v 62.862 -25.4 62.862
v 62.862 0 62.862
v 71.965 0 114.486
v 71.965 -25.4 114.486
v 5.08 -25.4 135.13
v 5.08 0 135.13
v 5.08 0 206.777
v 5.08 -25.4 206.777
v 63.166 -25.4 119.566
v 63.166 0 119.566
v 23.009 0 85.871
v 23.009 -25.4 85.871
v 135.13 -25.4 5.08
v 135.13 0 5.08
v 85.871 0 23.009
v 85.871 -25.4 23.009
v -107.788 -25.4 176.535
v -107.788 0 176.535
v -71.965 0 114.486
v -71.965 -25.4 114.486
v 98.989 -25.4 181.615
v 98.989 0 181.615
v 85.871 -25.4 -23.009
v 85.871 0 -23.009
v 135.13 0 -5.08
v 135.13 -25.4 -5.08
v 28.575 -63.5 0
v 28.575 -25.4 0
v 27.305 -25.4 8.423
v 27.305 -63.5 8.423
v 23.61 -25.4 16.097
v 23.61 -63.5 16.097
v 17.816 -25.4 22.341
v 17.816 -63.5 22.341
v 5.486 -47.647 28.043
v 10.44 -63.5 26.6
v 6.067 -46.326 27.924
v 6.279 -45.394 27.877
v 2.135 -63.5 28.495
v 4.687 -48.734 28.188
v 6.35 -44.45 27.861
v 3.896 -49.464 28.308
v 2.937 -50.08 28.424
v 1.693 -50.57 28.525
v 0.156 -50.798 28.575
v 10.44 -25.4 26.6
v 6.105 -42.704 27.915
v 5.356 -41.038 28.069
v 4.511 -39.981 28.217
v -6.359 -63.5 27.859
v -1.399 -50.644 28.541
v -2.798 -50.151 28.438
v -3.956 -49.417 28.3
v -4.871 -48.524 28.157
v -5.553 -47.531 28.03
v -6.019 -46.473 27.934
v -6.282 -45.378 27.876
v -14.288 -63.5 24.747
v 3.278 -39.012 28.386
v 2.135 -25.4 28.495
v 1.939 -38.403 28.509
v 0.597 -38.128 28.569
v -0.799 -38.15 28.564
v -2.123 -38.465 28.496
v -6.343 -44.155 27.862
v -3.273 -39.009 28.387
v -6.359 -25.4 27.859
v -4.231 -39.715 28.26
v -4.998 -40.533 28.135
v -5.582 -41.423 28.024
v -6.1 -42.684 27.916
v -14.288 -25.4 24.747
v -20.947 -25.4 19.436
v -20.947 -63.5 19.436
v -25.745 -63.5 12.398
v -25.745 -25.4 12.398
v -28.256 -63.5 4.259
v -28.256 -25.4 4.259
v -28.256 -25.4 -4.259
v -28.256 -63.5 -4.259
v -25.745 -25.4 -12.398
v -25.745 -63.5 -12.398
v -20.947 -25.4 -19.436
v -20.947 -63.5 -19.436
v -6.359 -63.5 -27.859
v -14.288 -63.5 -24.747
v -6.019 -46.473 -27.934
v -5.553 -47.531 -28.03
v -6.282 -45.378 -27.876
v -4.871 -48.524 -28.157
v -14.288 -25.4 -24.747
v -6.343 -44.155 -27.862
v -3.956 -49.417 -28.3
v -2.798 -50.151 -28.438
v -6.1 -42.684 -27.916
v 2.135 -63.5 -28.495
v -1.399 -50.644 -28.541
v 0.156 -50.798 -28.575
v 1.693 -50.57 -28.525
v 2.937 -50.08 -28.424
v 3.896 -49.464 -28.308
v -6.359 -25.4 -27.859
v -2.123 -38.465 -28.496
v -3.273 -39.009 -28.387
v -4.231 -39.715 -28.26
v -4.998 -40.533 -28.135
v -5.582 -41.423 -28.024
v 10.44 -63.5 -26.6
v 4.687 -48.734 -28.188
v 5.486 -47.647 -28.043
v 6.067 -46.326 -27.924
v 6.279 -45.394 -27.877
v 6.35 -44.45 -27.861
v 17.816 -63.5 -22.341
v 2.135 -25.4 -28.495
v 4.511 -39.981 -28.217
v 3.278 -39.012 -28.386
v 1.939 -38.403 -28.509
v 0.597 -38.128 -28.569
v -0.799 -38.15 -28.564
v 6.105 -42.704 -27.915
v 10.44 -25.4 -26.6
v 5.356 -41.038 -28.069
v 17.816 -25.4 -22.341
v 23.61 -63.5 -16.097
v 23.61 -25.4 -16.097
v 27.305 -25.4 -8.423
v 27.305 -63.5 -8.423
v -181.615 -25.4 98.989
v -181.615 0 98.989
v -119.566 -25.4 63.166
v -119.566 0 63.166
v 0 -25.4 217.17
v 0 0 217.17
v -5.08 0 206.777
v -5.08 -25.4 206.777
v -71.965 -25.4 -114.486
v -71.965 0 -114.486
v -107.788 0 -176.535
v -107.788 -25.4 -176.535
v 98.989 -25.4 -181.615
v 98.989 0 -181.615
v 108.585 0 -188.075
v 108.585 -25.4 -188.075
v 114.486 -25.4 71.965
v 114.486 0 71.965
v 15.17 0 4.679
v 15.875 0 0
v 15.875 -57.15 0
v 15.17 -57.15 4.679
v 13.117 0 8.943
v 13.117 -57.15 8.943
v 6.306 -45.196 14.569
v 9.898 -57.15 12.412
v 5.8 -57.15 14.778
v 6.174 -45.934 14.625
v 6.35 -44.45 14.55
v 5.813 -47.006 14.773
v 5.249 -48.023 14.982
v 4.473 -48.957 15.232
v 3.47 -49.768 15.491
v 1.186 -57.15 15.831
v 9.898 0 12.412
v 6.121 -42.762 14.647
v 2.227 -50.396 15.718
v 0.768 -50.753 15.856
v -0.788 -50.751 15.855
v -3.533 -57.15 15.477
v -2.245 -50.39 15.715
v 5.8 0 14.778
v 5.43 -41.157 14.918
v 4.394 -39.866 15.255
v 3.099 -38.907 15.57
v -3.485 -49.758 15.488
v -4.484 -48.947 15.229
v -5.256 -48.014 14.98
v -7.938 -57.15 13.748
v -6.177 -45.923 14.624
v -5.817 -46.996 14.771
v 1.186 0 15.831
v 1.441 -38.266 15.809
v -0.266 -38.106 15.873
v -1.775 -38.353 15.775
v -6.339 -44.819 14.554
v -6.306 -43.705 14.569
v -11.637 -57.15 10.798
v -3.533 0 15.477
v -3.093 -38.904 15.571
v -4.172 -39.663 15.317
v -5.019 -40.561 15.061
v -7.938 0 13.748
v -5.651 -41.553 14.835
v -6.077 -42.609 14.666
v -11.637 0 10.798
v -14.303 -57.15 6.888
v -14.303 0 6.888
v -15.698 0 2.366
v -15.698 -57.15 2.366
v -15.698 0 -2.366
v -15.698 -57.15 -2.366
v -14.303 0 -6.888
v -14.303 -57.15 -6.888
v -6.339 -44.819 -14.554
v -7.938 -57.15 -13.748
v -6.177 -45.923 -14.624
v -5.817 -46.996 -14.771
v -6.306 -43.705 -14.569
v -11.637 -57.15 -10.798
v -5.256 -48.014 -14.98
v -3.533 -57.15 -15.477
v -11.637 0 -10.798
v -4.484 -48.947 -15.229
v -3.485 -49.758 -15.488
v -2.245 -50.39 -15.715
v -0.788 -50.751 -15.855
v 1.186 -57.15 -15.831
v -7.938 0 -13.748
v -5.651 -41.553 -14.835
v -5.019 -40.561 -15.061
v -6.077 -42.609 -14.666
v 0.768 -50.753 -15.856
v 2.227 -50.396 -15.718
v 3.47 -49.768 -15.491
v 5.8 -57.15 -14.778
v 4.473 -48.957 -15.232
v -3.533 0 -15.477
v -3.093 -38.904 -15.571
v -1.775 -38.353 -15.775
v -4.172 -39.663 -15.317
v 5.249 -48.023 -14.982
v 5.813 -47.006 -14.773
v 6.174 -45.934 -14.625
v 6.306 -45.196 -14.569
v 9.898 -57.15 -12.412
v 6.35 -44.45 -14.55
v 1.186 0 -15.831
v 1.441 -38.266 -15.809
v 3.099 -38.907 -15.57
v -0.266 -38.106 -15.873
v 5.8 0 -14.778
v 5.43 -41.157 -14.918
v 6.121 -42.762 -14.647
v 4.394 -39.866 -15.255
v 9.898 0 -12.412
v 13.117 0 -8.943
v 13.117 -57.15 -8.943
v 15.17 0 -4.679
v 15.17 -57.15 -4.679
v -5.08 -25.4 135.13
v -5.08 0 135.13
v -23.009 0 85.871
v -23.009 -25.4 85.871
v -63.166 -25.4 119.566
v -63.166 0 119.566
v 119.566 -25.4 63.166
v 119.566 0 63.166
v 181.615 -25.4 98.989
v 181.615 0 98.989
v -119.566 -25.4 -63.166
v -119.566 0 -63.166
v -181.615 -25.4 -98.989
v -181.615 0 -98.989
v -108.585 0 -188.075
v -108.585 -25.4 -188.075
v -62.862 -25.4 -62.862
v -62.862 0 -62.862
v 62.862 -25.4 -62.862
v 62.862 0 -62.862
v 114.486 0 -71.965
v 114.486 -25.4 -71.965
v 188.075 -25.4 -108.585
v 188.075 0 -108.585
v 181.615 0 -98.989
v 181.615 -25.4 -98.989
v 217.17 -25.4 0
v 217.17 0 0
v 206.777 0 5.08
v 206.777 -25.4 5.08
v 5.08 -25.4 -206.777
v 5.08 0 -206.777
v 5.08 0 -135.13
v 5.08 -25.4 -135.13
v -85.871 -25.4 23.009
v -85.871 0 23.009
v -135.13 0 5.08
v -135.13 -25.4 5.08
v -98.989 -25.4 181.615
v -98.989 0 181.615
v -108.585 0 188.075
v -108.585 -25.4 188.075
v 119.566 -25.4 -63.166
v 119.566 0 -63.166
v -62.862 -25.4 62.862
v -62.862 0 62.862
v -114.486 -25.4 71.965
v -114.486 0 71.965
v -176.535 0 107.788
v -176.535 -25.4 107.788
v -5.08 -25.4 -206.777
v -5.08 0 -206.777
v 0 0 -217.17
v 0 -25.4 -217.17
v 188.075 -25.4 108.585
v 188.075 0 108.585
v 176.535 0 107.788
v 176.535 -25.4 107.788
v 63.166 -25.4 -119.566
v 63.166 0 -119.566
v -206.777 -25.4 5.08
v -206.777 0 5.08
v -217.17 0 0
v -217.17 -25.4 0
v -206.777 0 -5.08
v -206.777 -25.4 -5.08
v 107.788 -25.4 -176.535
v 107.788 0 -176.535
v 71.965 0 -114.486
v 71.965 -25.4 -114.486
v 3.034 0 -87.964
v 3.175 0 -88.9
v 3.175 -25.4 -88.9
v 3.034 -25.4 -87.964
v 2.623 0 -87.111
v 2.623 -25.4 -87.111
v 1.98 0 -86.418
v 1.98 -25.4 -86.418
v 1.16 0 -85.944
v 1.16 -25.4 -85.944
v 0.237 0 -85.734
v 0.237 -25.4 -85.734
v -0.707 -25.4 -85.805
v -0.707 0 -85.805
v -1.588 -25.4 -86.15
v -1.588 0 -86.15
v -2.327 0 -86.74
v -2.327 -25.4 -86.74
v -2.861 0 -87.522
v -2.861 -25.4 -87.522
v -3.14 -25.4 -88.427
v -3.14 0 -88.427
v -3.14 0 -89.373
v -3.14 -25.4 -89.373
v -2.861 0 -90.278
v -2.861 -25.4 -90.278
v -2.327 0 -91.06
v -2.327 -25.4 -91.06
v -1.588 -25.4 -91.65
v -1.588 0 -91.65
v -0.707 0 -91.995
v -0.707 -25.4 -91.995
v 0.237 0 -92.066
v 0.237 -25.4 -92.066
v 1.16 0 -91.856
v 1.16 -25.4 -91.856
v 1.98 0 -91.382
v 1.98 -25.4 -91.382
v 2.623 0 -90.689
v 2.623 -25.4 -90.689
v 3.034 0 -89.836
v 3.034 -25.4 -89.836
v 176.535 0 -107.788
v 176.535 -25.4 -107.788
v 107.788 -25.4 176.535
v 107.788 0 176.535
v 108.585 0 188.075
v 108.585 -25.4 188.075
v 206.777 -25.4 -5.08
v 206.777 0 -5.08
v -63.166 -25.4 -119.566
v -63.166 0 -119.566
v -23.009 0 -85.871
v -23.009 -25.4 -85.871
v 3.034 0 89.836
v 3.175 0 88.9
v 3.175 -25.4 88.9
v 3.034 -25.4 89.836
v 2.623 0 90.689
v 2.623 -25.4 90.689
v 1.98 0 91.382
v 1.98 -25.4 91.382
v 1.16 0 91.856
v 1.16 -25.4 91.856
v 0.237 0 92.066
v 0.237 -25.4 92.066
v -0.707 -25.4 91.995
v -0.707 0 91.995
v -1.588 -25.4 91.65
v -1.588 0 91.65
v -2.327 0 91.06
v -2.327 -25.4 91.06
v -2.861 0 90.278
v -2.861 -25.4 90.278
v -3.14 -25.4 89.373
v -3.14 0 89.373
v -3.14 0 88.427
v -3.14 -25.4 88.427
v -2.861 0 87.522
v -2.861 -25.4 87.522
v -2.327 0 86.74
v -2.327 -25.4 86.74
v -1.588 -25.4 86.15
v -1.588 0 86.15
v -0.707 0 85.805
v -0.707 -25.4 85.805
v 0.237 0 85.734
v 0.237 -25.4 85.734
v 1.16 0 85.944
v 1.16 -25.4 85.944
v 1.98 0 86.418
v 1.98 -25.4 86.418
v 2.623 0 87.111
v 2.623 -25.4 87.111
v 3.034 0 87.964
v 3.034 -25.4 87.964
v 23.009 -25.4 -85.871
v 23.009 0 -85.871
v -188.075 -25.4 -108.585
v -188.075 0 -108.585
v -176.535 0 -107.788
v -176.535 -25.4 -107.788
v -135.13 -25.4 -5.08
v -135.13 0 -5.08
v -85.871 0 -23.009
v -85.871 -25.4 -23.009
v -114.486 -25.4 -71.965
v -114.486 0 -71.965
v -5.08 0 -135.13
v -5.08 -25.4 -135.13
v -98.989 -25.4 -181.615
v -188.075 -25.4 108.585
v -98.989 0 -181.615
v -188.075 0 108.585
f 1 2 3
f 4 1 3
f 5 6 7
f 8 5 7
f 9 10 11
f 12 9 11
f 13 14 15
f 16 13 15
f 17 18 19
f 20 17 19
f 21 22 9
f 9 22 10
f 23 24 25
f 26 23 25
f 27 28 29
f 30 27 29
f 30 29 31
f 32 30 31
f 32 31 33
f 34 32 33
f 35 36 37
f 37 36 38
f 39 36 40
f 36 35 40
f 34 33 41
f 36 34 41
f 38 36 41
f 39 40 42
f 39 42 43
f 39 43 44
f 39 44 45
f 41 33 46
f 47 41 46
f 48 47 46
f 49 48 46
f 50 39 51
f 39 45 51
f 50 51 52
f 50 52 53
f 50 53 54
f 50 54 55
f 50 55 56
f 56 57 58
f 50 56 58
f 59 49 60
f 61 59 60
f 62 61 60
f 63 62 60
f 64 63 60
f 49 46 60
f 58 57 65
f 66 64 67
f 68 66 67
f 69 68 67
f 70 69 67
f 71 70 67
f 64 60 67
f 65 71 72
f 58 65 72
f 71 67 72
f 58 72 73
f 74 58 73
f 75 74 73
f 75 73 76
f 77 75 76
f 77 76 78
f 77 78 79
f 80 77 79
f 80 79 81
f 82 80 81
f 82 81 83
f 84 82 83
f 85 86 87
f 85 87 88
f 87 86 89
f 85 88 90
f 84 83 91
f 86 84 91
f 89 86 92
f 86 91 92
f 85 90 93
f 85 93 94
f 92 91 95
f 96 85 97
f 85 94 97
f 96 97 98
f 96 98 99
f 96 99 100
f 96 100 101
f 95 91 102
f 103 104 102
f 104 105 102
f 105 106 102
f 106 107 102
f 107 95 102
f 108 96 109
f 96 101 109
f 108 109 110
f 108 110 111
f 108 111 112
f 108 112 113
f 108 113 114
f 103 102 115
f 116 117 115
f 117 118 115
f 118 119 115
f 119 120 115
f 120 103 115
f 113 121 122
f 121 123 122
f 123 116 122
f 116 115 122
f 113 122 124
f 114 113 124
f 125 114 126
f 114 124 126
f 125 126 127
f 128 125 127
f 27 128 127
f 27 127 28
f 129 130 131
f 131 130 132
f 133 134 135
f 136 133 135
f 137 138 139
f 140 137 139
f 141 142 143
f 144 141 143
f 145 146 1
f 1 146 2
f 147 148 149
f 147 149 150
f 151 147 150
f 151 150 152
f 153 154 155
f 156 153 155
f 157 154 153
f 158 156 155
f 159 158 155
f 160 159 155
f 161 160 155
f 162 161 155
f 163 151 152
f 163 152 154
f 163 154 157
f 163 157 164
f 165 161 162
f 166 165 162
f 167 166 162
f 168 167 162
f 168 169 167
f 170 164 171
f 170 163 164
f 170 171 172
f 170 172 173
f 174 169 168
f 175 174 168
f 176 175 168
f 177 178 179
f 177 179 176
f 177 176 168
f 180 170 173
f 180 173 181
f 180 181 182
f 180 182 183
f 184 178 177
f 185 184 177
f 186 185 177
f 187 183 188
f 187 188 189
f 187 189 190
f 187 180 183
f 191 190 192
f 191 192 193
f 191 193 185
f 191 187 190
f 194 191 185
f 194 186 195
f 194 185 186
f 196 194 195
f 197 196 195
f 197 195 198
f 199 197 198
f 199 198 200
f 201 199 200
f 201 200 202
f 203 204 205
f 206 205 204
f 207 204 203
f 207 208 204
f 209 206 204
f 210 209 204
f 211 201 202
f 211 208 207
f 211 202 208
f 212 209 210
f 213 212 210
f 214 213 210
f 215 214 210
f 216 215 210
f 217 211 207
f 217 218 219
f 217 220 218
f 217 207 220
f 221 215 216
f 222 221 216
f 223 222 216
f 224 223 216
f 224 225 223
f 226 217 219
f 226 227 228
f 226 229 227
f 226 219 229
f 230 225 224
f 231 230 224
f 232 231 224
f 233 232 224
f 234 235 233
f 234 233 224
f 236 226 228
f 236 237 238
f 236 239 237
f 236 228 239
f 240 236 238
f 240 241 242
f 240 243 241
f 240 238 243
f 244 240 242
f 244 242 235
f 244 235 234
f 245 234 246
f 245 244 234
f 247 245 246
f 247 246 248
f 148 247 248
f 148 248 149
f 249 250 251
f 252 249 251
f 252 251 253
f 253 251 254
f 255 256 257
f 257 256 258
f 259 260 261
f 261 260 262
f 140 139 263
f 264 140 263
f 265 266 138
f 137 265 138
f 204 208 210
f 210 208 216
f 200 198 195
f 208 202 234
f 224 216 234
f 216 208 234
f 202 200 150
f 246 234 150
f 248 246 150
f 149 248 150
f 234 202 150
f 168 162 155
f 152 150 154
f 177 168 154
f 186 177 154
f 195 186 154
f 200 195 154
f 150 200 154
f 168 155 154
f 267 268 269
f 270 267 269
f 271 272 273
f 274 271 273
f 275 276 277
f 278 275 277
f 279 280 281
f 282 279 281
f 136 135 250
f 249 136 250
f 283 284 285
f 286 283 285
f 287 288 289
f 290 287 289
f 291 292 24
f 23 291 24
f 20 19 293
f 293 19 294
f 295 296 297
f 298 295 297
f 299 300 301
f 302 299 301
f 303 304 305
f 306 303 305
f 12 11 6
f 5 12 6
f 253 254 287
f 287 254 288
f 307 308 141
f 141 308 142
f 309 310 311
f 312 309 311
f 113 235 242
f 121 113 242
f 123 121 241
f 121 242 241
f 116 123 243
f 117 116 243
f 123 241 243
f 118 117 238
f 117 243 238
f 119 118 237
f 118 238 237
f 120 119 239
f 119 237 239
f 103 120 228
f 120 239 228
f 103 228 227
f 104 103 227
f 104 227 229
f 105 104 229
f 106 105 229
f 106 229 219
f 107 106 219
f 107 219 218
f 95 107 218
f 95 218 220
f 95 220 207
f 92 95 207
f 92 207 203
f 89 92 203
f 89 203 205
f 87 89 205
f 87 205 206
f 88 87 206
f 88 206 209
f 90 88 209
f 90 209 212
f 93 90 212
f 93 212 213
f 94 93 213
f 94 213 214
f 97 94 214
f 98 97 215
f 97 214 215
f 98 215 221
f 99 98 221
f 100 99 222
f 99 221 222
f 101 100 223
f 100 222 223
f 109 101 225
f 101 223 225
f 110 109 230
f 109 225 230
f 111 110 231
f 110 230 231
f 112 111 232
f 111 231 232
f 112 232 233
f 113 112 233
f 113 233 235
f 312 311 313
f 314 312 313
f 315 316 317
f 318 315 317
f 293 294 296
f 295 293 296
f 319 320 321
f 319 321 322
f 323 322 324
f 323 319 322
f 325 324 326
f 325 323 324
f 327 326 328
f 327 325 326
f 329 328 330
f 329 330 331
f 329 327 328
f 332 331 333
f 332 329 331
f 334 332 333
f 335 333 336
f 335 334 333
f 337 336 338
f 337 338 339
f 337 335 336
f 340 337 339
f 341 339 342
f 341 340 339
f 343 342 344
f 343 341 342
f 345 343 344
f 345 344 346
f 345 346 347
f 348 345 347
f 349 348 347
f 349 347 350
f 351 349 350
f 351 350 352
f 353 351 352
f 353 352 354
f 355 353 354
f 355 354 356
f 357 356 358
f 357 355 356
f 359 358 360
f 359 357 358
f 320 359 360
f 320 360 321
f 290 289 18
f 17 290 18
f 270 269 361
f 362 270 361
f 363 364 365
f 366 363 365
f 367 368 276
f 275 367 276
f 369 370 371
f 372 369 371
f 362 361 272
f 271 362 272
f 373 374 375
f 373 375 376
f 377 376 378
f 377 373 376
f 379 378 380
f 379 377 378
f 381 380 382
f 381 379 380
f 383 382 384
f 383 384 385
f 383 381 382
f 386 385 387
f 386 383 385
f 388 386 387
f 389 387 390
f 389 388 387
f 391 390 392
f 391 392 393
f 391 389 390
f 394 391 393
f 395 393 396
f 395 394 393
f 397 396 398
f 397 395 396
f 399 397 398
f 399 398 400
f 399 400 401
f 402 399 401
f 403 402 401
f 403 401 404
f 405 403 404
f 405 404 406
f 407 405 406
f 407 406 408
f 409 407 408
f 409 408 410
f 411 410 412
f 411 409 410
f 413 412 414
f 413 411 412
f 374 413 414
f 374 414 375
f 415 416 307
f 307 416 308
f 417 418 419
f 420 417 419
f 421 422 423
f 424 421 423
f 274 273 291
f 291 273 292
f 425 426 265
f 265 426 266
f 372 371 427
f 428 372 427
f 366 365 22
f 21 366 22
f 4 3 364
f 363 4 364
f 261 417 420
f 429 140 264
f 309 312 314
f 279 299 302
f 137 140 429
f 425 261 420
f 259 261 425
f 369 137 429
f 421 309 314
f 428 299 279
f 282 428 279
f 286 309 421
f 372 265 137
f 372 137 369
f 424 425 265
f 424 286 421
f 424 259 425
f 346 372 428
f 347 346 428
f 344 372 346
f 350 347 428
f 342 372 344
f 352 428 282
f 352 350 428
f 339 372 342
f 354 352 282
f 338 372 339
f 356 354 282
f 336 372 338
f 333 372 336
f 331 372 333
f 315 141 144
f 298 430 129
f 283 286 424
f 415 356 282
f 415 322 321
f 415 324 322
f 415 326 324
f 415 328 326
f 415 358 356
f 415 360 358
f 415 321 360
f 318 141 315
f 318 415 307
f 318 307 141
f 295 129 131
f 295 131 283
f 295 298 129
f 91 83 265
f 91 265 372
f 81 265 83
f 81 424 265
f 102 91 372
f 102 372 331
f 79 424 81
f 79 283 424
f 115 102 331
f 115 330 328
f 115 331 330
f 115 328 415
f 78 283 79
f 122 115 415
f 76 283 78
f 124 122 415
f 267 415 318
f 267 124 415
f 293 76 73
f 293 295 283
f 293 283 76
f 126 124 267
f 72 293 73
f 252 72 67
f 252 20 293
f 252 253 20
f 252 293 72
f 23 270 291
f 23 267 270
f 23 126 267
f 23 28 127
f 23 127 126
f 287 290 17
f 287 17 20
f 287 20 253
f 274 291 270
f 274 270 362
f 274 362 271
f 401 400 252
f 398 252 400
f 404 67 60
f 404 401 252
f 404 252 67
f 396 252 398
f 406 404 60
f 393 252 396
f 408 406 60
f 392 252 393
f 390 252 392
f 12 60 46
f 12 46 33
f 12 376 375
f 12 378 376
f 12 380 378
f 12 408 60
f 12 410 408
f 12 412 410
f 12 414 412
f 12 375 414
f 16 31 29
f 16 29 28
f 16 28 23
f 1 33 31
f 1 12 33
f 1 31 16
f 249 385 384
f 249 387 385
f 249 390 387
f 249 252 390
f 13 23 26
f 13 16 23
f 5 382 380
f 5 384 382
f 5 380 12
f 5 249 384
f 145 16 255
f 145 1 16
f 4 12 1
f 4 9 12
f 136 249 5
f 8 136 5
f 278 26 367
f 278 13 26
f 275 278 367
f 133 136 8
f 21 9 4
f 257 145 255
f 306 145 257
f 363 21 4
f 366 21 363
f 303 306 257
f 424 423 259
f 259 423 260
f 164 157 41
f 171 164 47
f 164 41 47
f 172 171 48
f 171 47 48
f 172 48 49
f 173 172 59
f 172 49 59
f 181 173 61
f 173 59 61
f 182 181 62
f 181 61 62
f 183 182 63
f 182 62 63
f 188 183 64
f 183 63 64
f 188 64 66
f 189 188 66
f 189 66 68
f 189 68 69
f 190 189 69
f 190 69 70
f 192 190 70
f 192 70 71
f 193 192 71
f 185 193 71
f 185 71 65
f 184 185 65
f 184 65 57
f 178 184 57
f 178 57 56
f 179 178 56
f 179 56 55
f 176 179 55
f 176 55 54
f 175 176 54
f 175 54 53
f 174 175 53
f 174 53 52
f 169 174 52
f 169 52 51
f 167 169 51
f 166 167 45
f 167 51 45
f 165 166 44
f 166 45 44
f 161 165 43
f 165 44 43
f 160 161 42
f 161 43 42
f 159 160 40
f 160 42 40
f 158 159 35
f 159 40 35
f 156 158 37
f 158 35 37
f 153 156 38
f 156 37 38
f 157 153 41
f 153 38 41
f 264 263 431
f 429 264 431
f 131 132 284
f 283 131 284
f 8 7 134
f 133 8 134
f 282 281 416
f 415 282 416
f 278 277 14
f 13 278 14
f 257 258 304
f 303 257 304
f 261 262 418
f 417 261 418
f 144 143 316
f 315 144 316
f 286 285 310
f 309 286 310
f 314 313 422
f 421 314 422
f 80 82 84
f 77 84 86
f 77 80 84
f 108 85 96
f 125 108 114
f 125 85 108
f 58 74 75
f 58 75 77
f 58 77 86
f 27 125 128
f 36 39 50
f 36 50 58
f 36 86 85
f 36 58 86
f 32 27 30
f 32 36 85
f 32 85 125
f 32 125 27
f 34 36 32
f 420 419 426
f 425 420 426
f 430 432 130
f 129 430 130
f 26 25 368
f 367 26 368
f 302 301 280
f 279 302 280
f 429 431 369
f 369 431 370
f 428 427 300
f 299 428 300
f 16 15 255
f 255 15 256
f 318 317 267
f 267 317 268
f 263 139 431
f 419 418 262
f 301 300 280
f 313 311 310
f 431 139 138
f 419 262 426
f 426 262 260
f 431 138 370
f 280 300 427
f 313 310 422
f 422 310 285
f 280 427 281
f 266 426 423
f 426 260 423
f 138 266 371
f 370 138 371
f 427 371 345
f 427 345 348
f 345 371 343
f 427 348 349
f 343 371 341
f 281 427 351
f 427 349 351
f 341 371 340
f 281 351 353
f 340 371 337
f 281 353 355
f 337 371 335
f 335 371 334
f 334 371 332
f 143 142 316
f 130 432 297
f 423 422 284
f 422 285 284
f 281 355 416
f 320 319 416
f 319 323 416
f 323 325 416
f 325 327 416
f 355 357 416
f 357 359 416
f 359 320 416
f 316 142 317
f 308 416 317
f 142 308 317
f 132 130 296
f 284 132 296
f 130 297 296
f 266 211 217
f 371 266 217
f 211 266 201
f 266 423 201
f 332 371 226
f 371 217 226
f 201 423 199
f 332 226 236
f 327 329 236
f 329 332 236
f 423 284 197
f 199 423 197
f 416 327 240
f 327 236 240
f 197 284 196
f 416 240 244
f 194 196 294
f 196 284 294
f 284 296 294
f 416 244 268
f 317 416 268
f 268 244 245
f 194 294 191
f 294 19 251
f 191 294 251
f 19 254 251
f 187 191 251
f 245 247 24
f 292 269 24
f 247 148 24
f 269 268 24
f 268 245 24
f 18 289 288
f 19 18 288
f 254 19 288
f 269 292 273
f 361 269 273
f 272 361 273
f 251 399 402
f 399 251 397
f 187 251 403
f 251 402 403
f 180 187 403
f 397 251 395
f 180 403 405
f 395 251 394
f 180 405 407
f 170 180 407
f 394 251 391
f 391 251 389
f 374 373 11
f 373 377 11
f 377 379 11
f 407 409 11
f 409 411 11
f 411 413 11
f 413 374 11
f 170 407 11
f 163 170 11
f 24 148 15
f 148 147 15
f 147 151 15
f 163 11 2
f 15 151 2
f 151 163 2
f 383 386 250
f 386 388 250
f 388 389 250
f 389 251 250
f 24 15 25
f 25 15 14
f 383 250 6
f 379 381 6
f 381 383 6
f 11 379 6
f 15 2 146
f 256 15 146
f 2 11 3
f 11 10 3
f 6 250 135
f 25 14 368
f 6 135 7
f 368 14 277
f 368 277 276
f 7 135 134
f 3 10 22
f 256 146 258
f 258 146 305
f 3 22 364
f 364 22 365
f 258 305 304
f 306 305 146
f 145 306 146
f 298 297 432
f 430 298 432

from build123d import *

# Parameters (mm, degrees)
F2_DEPTH  = 25.4
F3_R      = 28.575
F4_DEPTH  = 63.5
F5_R      = 15.875
F6_DEPTH  = 57.15
F9_R      = 6.35
F10_DEPTH = 63.5
F11_R     = 3.175
F12_DEPTH = 25.4


with BuildPart() as f2:
    # F1 (on face) → F2 (new body)
    with BuildSketch(Plane.XZ):
        Polygon((5.08, 135.130365), (5.08, 206.777484), (0, 217.17), (-5.08, 206.777484), (-5.08, 135.130365), (-23.009013, 85.870806), (0, 0), (23.009013, 85.870806), align=None)
        Polygon((63.165773, 119.566329), (23.009013, 85.870806), (0, 0), (62.861793, 62.861793), (71.964591, 114.486329), (107.788151, 176.534554), (108.585, 188.074737), (98.989333, 181.614554), align=None)
        Polygon((-62.861793, 62.861793), (0, 0), (-23.009013, 85.870806), (-63.165773, 119.566329), (-98.989333, 181.614554), (-108.585, 188.074737), (-107.788151, 176.534554), (-71.964591, 114.486329), align=None)
        Polygon((-85.870806, 23.009013), (0, 0), (-62.861793, 62.861793), (-114.486329, 71.964591), (-176.534554, 107.788151), (-188.074737, 108.585), (-181.614554, 98.989333), (-119.566329, 63.165773), align=None)
        Polygon((-85.870806, -23.009013), (0, 0), (-85.870806, 23.009013), (-135.130365, 5.08), (-206.777484, 5.08), (-217.17, 0), (-206.777484, -5.08), (-135.130365, -5.08), align=None)
        Polygon((-62.861793, -62.861793), (0, 0), (-85.870806, -23.009013), (-119.566329, -63.165773), (-181.614554, -98.989333), (-188.074737, -108.585), (-176.534554, -107.788151), (-114.486329, -71.964591), align=None)
        Polygon((-23.009013, -85.870806), (0, 0), (-62.861793, -62.861793), (-71.964591, -114.486329), (-107.788151, -176.534554), (-108.585, -188.074737), (-98.989333, -181.614554), (-63.165773, -119.566329), align=None)
        Polygon((23.009013, -85.870806), (0, 0), (-23.009013, -85.870806), (-5.08, -135.130365), (-5.08, -206.777484), (0, -217.17), (5.08, -206.777484), (5.08, -135.130365), align=None)
        Polygon((62.861793, -62.861793), (0, 0), (23.009013, -85.870806), (63.165773, -119.566329), (98.989333, -181.614554), (108.585, -188.074737), (107.788151, -176.534554), (71.964591, -114.486329), align=None)
        Polygon((85.870806, -23.009013), (0, 0), (62.861793, -62.861793), (114.486329, -71.964591), (176.534554, -107.788151), (188.074737, -108.585), (181.614554, -98.989333), (119.566329, -63.165773), align=None)
        Polygon((85.870806, 23.009013), (0, 0), (85.870806, -23.009013), (135.130365, -5.08), (206.777484, -5.08), (217.17, 0), (206.777484, 5.08), (135.130365, 5.08), align=None)
        Polygon((62.861793, 62.861793), (0, 0), (85.870806, 23.009013), (119.566329, 63.165773), (181.614554, 98.989333), (188.074737, 108.585), (176.534554, 107.788151), (114.486329, 71.964591), align=None)
    extrude(amount=F2_DEPTH)

    # F3 (on face) → F4 (join)
    with BuildSketch(Plane.XZ):
        Circle(F3_R)
    extrude(amount=F4_DEPTH)

    # F5 (on face) → F6 (cut)
    with BuildSketch(Plane.XZ):
        Circle(F5_R)
    extrude(amount=F6_DEPTH, mode=Mode.SUBTRACT)

    # F9 (on offset) → F10 (cut)
    with BuildSketch(Plane.XY.offset(28.575)):
        with Locations((0, -44.45)):
            Circle(F9_R)
    extrude(amount=-F10_DEPTH, mode=Mode.SUBTRACT)

    # F11 (on face) → F12 (cut)
    with BuildSketch(Plane.XZ):
        with Locations((0, -88.9)):
            Circle(F11_R)
        with Locations((0, 88.9)):
            Circle(F11_R)
    extrude(amount=F12_DEPTH, mode=Mode.SUBTRACT)


solid = f2.part
